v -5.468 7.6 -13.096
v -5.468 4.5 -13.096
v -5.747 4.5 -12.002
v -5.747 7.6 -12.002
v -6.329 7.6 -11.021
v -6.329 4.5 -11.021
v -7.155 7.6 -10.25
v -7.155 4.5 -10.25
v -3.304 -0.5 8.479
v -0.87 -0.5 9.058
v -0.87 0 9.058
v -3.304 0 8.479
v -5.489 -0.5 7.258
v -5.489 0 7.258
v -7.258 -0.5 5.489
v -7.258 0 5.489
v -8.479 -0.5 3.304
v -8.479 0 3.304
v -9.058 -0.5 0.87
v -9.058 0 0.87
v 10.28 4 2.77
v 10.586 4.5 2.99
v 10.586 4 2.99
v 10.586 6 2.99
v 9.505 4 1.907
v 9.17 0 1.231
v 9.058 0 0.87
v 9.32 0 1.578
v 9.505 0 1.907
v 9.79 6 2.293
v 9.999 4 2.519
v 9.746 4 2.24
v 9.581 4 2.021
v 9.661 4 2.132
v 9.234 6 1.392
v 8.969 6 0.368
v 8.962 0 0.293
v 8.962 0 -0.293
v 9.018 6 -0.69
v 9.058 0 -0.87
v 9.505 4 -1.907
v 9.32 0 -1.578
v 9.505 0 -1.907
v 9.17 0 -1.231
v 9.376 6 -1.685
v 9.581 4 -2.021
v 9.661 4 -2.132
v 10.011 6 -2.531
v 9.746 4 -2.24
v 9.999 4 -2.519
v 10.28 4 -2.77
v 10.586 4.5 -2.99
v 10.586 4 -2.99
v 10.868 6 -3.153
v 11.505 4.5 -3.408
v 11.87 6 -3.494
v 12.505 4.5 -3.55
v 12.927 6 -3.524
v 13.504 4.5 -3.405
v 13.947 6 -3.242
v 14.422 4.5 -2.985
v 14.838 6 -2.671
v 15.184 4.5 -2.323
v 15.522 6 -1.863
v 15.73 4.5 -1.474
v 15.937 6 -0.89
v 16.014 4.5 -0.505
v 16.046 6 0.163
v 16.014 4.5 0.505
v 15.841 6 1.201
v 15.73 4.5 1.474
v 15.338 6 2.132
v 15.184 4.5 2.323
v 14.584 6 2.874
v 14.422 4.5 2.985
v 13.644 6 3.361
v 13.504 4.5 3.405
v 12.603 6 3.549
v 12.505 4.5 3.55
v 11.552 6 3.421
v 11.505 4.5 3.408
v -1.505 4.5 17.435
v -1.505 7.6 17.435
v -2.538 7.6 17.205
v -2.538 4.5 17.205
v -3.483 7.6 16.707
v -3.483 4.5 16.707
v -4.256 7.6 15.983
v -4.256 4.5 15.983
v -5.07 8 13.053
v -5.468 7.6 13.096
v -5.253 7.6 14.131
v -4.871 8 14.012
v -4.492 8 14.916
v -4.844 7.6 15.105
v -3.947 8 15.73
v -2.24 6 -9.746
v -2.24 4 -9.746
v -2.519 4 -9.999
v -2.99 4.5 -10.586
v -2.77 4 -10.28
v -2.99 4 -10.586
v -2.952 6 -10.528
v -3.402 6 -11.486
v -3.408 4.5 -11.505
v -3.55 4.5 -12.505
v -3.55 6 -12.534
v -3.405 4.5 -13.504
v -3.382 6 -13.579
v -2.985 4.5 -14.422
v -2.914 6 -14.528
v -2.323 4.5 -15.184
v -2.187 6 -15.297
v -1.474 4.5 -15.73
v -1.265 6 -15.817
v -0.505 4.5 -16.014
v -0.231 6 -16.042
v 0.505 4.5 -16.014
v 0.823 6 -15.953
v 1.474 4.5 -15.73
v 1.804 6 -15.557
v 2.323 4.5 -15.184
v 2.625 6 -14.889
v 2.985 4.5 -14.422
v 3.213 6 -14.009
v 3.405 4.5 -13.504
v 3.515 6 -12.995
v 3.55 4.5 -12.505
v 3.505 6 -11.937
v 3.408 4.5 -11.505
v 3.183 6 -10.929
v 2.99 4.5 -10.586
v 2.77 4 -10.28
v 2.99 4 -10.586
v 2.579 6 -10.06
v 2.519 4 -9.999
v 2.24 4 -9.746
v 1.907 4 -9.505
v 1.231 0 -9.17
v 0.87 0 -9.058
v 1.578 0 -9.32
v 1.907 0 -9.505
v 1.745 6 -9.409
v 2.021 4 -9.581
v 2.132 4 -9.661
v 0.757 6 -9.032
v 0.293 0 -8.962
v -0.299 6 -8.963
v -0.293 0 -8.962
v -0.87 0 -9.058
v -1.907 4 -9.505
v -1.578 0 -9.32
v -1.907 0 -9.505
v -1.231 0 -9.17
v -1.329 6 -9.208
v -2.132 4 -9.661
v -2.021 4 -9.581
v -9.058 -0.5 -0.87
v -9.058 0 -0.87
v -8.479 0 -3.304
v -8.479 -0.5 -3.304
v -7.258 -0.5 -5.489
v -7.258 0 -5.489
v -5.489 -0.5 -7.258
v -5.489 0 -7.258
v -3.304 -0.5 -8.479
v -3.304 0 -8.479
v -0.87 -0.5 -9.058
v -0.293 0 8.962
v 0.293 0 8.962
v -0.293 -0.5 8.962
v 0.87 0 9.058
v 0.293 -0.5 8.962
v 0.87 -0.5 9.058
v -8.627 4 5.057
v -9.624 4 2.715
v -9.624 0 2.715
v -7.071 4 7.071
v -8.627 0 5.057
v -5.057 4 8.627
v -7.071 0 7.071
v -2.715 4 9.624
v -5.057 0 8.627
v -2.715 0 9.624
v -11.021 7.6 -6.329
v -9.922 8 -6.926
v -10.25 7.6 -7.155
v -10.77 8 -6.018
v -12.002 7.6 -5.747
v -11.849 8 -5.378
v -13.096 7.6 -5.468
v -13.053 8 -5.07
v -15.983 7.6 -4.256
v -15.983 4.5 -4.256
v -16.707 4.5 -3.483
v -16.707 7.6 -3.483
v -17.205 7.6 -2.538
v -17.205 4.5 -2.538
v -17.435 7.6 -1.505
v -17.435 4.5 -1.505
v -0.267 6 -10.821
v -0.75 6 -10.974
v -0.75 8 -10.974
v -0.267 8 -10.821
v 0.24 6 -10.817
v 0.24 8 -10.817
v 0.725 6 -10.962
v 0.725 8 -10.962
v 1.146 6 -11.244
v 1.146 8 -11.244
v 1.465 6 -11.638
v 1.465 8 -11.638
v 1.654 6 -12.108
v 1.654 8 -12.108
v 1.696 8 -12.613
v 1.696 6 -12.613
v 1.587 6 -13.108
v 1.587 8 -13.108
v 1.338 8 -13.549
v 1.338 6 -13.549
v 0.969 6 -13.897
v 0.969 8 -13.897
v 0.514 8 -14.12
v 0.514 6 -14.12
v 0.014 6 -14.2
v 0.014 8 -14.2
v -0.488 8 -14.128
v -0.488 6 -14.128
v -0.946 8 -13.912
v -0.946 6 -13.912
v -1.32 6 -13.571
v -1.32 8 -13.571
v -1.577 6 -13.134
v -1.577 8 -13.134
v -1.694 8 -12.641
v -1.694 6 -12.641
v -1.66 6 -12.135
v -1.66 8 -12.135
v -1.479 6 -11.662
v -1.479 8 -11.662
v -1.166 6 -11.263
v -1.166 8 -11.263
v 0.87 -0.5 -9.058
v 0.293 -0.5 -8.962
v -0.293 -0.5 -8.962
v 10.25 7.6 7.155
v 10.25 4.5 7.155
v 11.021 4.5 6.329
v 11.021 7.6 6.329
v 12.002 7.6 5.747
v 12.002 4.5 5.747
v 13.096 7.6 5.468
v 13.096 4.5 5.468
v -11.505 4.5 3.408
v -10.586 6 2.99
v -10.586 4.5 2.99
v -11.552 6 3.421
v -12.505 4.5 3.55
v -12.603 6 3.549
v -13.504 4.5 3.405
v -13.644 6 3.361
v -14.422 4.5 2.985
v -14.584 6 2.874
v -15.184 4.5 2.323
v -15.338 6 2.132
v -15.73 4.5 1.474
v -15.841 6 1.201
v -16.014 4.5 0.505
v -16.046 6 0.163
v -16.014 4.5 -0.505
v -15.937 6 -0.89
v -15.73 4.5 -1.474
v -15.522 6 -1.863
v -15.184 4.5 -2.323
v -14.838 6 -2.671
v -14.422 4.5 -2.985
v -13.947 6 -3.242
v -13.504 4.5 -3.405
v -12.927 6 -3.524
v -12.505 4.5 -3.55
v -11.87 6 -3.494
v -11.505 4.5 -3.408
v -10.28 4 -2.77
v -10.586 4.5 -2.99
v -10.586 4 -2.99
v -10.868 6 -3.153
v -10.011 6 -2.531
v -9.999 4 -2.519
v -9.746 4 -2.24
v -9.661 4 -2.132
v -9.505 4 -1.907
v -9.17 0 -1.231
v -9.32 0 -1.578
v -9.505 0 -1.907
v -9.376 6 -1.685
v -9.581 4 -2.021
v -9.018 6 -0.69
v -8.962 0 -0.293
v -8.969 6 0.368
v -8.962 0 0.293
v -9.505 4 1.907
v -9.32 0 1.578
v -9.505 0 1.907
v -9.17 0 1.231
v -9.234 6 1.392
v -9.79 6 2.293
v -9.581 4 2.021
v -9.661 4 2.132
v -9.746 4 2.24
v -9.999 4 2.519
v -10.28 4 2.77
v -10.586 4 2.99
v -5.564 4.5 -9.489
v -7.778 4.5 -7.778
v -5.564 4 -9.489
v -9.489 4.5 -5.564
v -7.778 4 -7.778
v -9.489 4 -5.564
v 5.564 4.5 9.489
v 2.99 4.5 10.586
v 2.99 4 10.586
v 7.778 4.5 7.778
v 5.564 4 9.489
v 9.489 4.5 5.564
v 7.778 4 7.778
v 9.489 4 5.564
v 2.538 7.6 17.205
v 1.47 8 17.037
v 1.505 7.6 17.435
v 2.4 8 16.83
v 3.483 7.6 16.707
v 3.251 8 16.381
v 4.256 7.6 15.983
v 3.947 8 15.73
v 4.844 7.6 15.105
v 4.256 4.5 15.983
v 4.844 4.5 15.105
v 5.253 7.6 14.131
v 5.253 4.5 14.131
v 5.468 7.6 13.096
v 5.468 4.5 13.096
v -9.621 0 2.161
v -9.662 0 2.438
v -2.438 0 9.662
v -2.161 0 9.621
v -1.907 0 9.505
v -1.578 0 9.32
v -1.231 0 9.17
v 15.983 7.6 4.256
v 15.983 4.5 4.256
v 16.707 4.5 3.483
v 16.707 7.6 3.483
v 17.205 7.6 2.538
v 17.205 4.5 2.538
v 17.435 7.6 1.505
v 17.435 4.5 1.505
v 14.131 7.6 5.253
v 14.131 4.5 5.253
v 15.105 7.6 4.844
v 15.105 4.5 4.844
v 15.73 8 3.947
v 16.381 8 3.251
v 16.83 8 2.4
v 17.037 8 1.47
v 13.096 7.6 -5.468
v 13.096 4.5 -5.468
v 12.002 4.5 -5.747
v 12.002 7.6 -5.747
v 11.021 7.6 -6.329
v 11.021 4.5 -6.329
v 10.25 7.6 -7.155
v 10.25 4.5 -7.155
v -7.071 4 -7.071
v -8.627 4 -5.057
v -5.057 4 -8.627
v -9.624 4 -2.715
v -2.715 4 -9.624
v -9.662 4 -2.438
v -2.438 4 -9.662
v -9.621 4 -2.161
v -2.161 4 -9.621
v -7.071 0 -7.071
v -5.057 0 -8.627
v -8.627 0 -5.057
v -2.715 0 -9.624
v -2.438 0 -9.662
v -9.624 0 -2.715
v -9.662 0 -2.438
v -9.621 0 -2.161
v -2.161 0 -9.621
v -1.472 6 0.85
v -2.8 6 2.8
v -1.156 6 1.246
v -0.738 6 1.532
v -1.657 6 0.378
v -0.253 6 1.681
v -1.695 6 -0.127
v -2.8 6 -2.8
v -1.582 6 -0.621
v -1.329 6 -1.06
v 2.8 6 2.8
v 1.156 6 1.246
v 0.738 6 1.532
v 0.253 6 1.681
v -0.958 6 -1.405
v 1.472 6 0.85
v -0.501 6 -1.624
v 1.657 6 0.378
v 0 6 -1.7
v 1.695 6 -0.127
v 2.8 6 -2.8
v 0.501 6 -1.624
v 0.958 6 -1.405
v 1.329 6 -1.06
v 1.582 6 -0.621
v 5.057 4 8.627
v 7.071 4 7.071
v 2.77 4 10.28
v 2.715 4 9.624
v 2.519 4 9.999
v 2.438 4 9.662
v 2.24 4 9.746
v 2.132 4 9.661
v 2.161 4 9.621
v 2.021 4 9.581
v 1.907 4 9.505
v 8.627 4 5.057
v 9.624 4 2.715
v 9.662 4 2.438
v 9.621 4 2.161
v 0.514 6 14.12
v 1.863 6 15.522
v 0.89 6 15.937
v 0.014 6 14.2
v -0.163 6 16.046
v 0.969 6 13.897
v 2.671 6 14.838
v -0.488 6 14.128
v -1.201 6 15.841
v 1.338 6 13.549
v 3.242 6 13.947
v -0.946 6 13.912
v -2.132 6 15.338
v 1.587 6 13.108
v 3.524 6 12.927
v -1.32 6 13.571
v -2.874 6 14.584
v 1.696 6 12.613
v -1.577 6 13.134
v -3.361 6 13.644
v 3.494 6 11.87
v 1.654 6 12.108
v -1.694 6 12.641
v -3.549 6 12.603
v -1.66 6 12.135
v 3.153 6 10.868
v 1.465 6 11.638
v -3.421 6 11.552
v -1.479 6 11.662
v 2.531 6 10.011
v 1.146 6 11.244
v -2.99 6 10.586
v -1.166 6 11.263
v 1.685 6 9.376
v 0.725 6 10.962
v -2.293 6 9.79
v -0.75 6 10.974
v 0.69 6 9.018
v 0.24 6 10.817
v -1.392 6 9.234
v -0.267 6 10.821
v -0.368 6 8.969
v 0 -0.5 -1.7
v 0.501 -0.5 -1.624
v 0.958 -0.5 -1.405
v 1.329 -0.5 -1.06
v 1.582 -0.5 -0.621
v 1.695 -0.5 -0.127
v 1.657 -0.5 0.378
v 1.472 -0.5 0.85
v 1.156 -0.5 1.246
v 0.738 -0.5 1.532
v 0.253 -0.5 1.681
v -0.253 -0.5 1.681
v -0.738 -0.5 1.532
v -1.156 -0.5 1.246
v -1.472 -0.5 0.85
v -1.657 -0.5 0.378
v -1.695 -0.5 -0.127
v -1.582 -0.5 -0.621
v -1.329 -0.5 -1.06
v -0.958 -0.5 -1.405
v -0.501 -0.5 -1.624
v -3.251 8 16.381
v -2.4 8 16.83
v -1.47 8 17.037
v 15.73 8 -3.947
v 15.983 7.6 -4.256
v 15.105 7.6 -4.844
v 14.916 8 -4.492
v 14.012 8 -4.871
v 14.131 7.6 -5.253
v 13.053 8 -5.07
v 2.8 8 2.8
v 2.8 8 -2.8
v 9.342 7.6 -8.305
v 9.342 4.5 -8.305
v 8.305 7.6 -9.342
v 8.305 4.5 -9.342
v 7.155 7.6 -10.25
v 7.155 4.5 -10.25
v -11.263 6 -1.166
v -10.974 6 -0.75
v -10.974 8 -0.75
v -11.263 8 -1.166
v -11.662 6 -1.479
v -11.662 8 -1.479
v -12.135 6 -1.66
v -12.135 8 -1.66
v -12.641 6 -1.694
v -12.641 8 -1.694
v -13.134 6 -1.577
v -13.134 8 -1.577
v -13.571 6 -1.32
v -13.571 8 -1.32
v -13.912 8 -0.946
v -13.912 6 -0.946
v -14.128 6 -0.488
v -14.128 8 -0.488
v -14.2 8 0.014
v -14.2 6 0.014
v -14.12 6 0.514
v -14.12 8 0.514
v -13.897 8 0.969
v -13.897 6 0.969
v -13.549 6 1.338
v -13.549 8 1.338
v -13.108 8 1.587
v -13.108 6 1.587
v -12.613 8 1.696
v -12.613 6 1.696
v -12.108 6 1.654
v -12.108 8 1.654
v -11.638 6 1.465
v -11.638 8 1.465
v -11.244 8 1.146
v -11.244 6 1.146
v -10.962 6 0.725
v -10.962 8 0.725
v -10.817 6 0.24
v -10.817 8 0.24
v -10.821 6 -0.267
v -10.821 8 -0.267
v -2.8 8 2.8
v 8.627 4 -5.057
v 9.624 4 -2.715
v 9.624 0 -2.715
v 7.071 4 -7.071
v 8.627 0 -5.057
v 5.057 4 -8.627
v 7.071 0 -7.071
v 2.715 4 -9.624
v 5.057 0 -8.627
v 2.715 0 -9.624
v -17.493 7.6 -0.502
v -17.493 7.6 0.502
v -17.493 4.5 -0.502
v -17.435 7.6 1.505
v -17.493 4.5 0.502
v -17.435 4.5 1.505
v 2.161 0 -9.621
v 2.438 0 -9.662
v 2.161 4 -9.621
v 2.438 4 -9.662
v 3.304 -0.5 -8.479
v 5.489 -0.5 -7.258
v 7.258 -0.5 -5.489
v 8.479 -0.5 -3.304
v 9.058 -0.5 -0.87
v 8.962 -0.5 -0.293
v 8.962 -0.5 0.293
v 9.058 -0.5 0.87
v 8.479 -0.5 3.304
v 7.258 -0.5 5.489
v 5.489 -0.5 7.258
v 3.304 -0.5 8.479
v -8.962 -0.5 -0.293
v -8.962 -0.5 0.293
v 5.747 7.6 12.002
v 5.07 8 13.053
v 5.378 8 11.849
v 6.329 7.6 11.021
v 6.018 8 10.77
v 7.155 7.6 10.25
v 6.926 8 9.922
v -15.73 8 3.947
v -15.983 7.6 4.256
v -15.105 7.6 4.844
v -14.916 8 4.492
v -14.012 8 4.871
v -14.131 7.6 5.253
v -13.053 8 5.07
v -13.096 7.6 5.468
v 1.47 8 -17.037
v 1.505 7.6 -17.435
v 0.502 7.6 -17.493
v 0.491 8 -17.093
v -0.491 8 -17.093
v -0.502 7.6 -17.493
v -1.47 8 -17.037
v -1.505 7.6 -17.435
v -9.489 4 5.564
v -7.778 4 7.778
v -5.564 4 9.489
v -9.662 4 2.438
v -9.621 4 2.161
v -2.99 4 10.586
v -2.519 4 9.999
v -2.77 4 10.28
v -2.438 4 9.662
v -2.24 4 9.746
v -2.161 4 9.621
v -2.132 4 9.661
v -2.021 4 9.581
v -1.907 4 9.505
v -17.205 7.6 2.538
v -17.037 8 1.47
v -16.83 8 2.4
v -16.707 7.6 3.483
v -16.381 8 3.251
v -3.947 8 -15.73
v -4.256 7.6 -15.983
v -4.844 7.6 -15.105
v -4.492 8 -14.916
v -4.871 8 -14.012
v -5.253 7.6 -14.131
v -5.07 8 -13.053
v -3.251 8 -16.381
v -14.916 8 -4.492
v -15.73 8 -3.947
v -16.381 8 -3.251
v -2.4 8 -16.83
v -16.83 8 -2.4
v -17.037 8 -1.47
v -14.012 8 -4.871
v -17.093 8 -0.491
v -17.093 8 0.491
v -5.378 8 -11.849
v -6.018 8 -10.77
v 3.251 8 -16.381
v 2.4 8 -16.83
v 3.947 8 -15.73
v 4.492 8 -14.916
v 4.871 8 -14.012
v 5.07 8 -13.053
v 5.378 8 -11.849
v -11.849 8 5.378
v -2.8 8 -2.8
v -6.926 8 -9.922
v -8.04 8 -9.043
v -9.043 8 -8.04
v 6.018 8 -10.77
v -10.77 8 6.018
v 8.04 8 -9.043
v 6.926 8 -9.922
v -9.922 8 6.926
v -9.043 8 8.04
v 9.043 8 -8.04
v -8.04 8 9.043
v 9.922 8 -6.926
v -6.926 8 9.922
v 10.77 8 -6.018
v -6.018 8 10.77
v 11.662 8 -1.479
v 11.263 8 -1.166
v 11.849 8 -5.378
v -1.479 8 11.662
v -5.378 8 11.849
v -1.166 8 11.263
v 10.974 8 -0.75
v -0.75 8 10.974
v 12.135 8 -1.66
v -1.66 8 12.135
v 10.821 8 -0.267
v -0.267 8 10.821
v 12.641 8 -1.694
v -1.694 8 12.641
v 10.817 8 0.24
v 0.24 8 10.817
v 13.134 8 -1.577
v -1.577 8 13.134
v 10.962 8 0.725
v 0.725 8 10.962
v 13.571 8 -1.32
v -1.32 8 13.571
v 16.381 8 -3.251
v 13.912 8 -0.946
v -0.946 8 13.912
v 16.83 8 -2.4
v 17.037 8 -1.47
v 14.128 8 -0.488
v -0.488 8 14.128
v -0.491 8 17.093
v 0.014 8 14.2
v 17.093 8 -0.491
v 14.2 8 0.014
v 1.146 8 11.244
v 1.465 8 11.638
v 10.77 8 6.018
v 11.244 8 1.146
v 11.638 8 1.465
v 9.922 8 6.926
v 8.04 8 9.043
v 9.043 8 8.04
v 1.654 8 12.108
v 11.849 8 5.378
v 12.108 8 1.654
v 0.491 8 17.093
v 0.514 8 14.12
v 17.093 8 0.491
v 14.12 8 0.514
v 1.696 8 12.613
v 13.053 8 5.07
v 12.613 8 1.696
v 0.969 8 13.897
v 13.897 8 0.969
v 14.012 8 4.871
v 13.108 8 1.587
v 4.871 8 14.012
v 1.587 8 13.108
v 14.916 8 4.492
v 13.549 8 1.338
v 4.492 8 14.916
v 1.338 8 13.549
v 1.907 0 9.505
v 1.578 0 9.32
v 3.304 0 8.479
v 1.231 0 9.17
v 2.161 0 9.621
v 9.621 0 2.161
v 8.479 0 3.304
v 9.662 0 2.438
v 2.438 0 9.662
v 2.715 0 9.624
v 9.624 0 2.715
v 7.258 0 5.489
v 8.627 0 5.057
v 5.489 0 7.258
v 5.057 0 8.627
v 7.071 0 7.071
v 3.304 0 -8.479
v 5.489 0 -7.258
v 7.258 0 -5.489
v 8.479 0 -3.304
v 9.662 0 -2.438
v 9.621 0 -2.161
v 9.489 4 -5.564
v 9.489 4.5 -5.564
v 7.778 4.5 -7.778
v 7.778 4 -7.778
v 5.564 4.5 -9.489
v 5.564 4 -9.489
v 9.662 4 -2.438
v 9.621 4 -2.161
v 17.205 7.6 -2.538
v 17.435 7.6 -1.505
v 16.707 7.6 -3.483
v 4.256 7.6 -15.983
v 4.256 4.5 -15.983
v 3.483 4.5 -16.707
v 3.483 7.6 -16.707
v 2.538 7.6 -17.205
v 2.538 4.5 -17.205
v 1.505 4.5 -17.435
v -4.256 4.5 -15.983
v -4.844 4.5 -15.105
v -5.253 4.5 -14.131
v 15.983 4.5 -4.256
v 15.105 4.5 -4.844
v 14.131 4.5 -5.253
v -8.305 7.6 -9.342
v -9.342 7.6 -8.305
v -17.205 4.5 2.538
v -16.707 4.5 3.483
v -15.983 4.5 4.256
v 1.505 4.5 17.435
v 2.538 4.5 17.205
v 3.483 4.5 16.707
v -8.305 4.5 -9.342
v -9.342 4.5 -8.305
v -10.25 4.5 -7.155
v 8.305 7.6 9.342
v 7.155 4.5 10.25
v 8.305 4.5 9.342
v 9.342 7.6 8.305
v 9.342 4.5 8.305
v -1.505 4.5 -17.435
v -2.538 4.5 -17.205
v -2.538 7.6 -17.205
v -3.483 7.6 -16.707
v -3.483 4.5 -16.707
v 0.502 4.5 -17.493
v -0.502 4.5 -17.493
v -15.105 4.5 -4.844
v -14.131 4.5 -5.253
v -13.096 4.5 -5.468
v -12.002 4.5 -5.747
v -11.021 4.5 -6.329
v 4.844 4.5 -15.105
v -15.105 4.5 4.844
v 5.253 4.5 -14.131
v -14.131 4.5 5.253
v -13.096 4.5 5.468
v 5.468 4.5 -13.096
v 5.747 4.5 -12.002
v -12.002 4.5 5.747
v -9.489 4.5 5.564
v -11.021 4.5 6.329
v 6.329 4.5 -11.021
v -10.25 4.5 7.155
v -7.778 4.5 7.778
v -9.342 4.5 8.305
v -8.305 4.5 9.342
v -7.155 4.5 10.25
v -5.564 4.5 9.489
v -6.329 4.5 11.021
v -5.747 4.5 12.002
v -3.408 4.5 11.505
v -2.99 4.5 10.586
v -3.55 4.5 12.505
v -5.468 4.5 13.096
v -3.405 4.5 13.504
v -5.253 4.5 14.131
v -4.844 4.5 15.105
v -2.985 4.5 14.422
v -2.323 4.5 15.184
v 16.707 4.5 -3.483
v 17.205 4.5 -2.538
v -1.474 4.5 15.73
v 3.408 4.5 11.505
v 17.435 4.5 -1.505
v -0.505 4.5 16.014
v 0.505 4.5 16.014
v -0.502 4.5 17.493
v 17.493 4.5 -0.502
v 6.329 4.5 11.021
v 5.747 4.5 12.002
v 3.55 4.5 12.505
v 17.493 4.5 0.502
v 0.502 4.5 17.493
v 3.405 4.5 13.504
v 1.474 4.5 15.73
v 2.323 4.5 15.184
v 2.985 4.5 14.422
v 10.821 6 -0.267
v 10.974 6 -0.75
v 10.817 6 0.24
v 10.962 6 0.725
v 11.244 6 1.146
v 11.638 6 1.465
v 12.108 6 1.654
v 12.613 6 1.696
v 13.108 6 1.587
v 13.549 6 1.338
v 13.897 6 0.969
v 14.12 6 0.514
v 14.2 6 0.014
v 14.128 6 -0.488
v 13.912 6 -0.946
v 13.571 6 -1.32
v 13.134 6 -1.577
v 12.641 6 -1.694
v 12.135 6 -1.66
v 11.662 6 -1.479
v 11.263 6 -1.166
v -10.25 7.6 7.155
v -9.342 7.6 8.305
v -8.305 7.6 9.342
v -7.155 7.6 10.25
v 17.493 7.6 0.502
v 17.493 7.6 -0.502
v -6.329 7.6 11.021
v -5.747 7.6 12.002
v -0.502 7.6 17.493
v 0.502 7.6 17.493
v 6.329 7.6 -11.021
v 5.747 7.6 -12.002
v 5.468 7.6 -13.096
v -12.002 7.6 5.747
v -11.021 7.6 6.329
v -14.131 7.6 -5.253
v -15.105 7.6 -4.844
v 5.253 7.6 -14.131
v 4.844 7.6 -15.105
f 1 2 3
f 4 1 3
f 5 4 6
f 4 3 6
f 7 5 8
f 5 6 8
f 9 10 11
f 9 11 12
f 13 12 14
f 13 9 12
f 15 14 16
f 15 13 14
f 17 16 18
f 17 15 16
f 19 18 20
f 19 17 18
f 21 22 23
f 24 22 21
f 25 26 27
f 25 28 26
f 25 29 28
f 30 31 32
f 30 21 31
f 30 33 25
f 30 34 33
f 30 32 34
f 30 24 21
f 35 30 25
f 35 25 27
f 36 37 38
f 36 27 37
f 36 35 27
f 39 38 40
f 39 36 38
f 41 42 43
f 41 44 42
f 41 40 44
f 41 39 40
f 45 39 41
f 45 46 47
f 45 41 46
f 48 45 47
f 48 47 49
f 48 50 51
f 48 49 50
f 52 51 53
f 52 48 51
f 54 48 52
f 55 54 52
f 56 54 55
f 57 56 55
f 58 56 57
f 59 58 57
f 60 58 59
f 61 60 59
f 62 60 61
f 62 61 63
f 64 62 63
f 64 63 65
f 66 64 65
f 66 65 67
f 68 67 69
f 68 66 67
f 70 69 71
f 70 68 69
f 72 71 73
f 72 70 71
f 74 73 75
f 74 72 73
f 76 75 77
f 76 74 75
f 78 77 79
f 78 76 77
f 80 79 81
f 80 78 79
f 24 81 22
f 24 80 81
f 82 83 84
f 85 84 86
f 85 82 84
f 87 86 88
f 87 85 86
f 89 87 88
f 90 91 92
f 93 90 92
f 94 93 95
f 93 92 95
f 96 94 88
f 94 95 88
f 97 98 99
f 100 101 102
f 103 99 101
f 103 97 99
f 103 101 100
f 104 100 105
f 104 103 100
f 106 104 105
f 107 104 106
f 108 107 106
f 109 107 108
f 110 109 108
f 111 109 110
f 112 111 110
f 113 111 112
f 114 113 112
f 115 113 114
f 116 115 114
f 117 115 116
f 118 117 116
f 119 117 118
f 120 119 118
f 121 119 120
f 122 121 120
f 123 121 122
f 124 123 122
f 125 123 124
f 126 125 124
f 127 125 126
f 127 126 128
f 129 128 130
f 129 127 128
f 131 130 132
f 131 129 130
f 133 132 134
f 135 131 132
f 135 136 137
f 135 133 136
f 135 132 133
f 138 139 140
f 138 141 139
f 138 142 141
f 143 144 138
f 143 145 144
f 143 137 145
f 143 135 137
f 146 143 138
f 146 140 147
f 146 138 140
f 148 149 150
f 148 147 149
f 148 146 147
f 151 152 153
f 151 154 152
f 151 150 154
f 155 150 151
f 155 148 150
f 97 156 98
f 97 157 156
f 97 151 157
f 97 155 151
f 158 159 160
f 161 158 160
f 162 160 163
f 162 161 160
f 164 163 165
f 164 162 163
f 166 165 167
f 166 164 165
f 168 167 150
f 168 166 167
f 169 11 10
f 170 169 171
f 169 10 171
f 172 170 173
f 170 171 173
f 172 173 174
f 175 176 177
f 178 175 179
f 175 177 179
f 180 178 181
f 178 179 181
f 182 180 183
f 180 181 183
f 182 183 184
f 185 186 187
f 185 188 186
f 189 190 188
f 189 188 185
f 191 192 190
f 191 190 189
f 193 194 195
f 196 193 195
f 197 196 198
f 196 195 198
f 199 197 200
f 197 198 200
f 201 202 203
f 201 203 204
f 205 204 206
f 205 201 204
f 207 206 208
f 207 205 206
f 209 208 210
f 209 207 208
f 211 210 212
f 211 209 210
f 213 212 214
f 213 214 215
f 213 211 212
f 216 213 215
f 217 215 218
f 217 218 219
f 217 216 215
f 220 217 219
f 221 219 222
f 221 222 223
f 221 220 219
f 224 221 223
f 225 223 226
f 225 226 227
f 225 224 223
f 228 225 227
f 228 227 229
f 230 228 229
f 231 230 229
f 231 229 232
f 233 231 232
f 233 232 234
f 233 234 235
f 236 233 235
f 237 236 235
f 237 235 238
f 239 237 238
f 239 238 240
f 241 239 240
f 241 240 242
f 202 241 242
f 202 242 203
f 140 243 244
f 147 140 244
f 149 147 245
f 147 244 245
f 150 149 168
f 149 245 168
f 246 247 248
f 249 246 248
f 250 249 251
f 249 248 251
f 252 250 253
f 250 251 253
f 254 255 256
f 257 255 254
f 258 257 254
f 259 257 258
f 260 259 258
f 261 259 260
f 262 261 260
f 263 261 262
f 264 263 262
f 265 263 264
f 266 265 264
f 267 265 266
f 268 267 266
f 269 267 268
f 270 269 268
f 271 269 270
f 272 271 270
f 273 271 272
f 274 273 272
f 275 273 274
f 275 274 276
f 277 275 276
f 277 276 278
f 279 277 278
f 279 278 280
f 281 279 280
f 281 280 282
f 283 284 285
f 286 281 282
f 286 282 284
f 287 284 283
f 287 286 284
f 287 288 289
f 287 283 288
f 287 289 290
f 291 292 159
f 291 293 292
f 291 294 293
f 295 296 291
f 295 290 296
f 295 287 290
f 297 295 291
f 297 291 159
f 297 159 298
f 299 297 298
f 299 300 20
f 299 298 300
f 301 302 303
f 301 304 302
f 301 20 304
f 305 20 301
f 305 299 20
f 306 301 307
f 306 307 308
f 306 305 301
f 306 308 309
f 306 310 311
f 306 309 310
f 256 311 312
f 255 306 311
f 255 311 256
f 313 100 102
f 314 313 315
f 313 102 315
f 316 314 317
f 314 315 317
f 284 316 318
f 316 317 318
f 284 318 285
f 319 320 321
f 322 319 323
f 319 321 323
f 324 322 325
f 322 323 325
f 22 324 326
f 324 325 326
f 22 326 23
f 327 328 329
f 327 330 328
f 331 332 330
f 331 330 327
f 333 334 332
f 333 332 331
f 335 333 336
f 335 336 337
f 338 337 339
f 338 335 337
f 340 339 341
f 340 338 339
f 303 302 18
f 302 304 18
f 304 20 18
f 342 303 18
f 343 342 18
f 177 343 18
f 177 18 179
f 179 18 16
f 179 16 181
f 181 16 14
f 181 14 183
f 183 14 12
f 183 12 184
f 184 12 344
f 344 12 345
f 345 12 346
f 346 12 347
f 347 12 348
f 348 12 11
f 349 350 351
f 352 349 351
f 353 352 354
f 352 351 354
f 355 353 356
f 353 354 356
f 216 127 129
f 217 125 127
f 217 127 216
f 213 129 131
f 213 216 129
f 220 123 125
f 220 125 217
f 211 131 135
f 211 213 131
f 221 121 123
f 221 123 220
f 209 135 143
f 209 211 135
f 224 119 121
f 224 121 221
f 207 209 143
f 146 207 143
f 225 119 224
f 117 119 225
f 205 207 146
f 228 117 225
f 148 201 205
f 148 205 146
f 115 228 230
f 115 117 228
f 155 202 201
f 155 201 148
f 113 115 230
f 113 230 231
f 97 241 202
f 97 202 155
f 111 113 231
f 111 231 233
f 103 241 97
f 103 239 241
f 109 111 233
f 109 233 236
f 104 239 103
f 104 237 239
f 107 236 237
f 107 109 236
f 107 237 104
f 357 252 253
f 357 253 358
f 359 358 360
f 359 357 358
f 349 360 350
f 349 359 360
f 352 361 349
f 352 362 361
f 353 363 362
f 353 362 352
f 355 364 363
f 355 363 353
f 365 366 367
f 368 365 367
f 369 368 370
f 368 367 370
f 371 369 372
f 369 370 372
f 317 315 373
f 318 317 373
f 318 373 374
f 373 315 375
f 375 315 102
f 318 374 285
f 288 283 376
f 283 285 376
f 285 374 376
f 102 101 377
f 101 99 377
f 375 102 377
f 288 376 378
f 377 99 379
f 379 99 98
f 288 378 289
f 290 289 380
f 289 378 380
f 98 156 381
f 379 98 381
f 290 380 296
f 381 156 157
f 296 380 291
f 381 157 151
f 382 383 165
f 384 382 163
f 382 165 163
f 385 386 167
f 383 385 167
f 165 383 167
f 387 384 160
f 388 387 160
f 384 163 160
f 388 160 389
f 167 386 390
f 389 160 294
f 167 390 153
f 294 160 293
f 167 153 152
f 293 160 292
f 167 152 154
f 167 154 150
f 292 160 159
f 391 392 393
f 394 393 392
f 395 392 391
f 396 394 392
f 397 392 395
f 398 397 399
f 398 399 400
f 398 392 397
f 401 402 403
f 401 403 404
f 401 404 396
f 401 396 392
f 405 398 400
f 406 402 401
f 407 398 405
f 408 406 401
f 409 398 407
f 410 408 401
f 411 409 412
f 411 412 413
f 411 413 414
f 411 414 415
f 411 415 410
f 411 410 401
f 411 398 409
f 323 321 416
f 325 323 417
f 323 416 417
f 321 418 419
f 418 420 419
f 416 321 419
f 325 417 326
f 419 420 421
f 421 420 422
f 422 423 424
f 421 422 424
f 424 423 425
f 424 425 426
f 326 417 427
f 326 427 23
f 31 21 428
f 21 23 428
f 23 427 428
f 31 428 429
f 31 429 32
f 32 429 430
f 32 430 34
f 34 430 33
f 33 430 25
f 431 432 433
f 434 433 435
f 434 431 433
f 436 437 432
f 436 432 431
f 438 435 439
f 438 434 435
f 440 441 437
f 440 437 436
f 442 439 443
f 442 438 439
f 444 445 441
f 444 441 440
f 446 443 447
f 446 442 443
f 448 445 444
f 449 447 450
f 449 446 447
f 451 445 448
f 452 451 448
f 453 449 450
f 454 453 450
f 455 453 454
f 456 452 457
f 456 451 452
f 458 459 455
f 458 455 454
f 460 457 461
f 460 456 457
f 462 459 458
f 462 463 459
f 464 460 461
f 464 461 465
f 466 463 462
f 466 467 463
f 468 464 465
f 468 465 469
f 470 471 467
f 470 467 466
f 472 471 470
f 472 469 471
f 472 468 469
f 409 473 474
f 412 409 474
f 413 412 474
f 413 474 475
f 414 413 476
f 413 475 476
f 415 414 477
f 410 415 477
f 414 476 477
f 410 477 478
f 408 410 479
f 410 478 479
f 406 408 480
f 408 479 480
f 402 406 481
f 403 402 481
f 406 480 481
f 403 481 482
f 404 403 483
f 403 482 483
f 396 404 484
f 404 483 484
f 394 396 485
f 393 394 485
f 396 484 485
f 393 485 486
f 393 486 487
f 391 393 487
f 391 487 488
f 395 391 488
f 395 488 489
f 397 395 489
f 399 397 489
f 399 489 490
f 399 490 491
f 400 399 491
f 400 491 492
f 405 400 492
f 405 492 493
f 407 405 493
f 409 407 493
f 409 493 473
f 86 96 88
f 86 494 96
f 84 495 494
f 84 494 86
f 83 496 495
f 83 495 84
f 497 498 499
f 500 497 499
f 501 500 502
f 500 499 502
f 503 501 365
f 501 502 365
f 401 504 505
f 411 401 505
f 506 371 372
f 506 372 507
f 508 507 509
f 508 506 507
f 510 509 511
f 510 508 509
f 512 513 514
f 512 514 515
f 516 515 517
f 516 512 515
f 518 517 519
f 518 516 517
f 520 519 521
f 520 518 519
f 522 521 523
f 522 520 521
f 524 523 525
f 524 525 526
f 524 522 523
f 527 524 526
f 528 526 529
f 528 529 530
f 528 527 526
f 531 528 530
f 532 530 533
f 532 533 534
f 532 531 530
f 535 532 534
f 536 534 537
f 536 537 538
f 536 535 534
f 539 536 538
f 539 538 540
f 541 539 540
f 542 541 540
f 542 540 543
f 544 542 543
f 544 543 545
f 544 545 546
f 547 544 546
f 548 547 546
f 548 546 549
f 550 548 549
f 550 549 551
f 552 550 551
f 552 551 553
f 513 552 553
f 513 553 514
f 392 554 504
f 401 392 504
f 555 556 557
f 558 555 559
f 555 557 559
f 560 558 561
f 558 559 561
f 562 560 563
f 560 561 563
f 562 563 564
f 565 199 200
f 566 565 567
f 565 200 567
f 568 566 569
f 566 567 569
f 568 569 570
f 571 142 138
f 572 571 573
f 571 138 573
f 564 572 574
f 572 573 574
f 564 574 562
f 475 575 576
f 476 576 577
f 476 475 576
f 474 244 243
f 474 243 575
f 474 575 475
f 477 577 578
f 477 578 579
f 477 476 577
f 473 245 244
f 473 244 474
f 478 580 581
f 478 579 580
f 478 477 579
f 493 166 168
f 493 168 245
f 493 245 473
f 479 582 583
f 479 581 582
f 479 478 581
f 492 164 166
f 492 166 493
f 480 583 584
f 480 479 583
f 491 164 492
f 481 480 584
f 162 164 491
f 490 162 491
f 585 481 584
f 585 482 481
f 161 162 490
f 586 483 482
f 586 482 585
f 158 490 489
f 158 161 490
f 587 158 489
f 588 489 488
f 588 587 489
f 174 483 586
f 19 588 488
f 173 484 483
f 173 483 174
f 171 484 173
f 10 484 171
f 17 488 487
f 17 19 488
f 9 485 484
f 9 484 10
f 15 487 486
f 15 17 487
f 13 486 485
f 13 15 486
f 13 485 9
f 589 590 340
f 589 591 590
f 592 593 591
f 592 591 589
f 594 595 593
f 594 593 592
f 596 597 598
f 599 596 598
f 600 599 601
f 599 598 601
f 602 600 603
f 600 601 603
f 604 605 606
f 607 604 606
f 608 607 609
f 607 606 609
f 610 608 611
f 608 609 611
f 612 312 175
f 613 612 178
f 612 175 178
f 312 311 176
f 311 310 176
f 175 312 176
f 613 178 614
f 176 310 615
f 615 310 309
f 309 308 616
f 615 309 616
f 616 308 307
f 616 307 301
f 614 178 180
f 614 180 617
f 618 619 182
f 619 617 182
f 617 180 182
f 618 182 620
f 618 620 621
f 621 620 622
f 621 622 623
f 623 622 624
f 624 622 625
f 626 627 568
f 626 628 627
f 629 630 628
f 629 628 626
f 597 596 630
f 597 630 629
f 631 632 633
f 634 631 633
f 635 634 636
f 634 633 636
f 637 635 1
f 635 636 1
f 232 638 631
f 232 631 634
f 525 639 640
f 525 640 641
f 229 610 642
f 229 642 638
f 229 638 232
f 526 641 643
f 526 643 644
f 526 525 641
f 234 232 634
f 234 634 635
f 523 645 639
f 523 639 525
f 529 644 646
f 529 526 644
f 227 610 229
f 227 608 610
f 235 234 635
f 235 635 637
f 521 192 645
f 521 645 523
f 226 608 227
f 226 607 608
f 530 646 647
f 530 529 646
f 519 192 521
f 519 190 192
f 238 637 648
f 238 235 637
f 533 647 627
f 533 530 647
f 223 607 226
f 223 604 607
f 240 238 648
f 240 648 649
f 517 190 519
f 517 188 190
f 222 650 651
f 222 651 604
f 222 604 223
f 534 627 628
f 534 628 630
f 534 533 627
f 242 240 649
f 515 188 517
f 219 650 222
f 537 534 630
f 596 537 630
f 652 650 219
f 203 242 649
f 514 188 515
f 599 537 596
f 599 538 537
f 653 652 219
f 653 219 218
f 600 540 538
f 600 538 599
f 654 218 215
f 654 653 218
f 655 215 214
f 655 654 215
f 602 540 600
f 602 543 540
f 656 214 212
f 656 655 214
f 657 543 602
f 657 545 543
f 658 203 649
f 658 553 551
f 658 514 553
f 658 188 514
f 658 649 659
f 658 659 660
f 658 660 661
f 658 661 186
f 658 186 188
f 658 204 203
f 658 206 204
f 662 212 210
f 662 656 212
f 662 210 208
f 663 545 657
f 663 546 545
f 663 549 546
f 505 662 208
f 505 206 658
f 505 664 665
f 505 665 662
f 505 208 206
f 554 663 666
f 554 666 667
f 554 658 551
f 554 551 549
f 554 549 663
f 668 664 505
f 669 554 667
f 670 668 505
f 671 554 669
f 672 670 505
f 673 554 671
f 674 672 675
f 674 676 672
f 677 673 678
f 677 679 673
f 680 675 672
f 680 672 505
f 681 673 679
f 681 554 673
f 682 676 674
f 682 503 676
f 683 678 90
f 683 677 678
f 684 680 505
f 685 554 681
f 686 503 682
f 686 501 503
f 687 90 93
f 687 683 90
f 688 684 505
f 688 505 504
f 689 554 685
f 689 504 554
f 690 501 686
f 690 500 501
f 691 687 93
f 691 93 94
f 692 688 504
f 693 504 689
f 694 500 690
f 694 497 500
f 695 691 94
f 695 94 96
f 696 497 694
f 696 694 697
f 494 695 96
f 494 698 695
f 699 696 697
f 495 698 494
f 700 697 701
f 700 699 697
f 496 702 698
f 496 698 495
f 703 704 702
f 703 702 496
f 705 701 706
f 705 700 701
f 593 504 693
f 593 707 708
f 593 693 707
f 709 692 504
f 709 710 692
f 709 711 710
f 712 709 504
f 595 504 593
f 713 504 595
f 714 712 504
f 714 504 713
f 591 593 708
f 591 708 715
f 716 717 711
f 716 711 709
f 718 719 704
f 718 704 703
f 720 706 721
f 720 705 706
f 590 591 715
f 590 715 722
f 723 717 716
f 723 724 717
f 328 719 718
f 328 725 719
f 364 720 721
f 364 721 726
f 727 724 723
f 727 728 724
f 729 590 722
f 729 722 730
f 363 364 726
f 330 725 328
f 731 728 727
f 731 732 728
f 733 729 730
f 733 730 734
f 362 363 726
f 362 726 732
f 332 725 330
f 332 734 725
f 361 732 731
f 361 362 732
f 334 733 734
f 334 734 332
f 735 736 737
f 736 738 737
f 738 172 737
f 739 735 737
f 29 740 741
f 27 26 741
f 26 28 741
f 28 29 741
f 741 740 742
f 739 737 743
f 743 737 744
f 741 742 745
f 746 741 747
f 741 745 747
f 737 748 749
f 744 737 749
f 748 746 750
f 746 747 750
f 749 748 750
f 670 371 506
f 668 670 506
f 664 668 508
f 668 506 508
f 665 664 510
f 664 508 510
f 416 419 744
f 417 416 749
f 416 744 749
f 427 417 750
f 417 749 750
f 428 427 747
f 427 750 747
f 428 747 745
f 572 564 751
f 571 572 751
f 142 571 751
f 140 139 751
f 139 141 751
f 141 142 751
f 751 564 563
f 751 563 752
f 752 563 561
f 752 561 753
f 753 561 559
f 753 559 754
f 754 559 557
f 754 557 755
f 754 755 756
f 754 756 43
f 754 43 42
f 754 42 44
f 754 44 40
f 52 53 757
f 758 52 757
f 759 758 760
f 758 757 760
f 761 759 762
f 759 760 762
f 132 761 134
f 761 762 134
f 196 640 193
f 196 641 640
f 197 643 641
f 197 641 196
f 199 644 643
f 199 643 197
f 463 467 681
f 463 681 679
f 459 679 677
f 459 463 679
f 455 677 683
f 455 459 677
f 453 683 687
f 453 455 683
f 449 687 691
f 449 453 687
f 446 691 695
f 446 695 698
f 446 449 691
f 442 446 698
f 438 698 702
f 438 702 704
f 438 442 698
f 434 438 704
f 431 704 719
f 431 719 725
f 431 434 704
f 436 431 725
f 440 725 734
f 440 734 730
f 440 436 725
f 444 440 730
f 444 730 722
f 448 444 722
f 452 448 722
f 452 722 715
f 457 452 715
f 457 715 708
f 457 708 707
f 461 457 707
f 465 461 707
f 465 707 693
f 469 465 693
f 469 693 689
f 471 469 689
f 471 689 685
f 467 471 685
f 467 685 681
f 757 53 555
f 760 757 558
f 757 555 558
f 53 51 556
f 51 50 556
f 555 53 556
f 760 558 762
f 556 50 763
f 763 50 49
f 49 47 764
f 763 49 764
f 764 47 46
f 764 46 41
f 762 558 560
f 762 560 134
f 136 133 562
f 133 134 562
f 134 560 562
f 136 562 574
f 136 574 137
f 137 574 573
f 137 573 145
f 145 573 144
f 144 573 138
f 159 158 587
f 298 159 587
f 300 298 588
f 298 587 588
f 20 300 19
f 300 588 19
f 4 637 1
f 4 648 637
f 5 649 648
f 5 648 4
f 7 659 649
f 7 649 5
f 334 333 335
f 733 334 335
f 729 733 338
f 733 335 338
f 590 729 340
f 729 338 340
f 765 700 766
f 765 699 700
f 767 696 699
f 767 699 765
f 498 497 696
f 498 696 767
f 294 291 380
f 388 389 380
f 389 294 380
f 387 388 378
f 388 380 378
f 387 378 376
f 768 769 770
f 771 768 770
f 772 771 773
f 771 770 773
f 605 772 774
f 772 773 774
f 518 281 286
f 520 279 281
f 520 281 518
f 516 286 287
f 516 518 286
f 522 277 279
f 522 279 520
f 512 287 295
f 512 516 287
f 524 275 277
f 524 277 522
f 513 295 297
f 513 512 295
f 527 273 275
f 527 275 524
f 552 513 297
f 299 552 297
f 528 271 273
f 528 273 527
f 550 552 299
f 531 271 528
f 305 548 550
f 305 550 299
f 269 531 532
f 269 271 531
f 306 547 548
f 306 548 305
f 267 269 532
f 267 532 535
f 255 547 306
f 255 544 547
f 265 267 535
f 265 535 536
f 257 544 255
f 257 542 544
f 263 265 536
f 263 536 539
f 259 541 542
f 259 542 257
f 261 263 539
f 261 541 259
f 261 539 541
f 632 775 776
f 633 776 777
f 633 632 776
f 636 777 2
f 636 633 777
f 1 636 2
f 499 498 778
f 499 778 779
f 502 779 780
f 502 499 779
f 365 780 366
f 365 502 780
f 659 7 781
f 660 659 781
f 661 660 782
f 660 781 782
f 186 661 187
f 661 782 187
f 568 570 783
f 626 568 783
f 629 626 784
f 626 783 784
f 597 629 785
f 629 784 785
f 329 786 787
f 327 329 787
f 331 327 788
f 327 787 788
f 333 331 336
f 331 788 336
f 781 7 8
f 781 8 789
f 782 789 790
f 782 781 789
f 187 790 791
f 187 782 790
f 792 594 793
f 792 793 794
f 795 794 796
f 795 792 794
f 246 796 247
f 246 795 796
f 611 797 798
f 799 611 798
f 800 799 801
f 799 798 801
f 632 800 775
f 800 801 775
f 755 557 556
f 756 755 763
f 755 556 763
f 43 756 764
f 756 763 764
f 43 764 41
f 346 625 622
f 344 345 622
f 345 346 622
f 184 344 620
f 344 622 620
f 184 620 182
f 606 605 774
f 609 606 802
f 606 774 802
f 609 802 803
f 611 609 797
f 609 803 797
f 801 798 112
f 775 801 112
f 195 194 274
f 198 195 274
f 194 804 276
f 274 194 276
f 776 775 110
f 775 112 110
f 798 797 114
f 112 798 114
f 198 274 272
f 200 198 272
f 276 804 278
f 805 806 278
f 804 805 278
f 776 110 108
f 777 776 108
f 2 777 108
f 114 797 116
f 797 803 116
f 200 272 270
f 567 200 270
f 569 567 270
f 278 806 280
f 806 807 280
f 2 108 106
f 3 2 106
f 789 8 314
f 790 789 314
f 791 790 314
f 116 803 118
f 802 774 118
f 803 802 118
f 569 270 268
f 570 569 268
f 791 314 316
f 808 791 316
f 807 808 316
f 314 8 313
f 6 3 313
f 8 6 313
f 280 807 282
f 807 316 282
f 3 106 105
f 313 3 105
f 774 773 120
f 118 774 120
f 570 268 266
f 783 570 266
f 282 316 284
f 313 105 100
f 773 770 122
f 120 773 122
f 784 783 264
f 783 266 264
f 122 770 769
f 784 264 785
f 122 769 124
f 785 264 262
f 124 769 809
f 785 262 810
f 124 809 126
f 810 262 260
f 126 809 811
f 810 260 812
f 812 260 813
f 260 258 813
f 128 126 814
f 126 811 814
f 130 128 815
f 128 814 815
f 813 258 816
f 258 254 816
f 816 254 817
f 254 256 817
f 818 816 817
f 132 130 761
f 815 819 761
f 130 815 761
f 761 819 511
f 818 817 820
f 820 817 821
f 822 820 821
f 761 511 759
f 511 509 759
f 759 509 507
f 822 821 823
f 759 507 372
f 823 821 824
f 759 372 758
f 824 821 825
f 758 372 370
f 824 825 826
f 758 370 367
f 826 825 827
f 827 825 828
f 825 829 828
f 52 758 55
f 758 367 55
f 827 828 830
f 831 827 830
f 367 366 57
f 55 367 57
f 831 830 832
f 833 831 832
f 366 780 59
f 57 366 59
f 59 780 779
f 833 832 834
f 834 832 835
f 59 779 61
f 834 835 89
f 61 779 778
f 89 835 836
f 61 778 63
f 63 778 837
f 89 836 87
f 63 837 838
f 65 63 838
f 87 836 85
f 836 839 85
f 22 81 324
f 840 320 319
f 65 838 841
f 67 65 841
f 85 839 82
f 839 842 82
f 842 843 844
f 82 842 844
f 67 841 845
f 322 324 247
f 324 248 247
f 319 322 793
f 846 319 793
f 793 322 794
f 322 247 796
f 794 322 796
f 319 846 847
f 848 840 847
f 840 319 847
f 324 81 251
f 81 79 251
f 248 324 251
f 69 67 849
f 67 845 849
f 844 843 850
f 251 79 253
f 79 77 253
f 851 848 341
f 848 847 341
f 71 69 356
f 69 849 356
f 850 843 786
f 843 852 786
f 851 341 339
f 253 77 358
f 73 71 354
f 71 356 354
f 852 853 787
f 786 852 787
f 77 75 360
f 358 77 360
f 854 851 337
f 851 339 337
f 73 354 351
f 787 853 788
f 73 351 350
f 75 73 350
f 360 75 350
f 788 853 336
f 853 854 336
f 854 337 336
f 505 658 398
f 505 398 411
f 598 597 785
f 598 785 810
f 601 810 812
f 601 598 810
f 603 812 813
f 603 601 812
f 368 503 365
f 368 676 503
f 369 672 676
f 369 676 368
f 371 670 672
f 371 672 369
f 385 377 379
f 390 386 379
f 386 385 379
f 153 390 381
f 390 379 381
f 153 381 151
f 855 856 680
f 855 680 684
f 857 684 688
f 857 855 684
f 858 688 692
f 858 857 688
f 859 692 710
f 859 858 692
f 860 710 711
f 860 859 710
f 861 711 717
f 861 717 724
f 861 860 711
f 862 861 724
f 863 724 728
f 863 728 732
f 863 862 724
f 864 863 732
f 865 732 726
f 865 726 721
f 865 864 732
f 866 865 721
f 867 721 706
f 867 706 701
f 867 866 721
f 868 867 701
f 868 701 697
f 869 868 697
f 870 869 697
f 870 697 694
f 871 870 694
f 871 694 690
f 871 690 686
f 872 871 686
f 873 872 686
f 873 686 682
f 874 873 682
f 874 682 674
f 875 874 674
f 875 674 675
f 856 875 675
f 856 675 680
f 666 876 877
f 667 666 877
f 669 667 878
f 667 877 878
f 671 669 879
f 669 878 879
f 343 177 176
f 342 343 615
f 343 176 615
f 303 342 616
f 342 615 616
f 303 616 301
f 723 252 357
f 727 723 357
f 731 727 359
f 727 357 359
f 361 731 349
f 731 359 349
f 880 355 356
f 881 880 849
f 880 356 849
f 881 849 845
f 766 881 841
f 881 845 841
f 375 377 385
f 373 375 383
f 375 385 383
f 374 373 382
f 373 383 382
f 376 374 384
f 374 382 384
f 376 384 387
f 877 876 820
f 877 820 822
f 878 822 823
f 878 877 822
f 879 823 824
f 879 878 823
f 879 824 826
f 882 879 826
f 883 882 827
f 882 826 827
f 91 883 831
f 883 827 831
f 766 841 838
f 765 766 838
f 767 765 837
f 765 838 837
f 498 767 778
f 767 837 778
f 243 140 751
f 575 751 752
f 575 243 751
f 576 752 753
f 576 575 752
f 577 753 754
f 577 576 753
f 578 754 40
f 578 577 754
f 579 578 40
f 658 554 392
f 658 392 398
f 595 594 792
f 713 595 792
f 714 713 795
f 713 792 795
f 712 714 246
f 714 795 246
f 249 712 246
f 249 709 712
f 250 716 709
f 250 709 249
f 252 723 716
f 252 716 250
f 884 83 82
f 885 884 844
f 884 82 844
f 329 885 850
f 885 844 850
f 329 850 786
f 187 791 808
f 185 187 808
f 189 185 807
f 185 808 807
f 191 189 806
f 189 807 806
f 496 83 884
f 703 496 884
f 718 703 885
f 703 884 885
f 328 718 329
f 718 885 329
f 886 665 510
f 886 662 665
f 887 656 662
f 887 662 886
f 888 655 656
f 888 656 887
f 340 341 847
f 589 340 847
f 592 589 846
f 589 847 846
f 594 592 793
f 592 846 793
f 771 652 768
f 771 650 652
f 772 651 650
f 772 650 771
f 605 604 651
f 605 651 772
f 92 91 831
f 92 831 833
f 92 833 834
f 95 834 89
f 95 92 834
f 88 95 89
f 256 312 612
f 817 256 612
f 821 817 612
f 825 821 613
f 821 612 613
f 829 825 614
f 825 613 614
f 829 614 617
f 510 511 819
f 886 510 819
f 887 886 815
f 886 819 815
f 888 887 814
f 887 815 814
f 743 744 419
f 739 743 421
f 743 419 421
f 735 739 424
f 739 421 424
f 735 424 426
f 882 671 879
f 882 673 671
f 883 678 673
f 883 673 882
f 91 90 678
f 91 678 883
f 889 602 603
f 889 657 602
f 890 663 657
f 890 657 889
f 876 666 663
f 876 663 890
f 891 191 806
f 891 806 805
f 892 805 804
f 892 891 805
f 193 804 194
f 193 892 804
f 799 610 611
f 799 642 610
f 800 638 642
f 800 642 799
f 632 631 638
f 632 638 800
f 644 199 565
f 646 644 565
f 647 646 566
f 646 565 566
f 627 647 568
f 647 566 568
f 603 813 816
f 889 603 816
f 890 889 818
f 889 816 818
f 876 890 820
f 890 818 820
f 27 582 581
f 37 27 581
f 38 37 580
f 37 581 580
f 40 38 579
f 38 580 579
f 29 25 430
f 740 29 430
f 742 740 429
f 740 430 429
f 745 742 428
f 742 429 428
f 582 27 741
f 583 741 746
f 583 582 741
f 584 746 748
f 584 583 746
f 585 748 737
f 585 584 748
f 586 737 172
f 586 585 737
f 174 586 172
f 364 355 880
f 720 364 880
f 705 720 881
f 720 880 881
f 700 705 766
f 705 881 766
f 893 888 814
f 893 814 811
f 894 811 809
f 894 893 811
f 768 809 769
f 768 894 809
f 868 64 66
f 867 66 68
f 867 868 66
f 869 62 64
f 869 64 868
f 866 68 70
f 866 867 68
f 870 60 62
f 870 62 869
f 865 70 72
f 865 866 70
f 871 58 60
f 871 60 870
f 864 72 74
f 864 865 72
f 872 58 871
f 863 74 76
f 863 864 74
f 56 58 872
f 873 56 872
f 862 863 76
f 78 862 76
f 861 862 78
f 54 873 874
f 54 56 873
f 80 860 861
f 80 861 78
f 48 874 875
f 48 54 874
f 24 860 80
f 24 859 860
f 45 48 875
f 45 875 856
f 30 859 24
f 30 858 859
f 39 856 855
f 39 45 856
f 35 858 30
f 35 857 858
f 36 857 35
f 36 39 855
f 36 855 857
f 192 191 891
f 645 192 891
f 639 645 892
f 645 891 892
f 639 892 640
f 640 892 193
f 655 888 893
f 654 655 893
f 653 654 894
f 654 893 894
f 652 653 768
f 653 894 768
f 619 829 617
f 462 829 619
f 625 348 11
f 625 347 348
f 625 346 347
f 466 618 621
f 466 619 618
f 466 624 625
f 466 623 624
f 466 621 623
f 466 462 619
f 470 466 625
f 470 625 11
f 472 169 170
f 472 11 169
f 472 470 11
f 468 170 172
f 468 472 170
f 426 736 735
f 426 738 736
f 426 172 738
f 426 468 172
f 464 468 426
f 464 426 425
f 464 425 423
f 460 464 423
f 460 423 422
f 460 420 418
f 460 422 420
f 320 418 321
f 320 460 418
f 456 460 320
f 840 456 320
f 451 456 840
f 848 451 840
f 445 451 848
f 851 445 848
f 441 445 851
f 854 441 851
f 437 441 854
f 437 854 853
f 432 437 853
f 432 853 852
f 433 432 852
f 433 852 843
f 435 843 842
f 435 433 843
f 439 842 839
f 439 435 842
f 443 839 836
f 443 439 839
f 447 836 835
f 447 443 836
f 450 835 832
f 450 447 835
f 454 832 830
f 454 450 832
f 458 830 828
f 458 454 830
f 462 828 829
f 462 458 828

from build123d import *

# Parameters (mm, degrees)
ESQUISSE1_R                  = 10
BOSS_EXTRU_1_DEPTH           = 4
ESQUISSE8_R                  = 11
BOSS_EXTRU_4_DEPTH           = 0.5
ESQUISSE3_R                  = 17.5
ESQUISSE3_R_2                = 1.7
BOSS_EXTRU_2_DEPTH           = 3.5
ENL_V_MAT_EXTRU_2_DEPTH      = 26.154522456
ENL_V_MAT_EXTRU_2_DEPTH_BACK = 1.5
ESQUISSE4_R                  = 3.55
ESQUISSE11_OUTSIDE_W         = 47.028
ESQUISSE11_OUTSIDE_H         = 47.028
ENL_V_MAT_EXTRU_3_DEPTH      = 27.009613607
CONG_1_R                     = 4
CONG_2_R                     = 1
CHANFREIN2_SIZE              = 0.4
ESQUISSE12_R                 = 1.7
ENL_V_MAT_EXTRU_4_DEPTH      = 27.009613773
ESQUISSE13_W                 = 5.6
ESQUISSE13_H                 = 5.6
ENL_V_MAT_EXTRU_5_DEPTH      = 2
BOSS_EXTRU_5_START           = 0.5
ESQUISSE14_R                 = 9.1
ESQUISSE14_R_2               = 1.7
BOSS_EXTRU_5_DEPTH           = 0.5
ESQUISSE15_R                 = 3.55
ENL_V_MAT_EXTRU_6_DEPTH      = 0.5


with BuildPart() as part:
    # Esquisse1 → Boss.-Extru.1 (new body)
    with BuildSketch(Plane(origin=(0, 0, 0), x_dir=(1, 0, 0), z_dir=(0, 1, 0))):
        Circle(ESQUISSE1_R)
    extrude(amount=BOSS_EXTRU_1_DEPTH)

    # Esquisse8 → Boss.-Extru.4 (add)
    with BuildSketch(Plane(origin=(0, 4, 0), x_dir=(1, 0, 0), z_dir=(0, 1, 0))):
        Circle(ESQUISSE8_R)
    extrude(amount=BOSS_EXTRU_4_DEPTH)

    # Esquisse3 → Boss.-Extru.2 (add)
    with BuildSketch(Plane(origin=(0, 4.5, 0), x_dir=(1, 0, 0), z_dir=(0, 1, 0))):
        Circle(ESQUISSE3_R)
        with Locations((-12.5, 0)):
            Circle(ESQUISSE3_R_2, mode=Mode.SUBTRACT)
        with Locations((0, 12.5)):
            Circle(ESQUISSE3_R_2, mode=Mode.SUBTRACT)
        with Locations((12.5, 0)):
            Circle(ESQUISSE3_R_2, mode=Mode.SUBTRACT)
        with Locations((0, -12.5)):
            Circle(ESQUISSE3_R_2, mode=Mode.SUBTRACT)
    extrude(amount=BOSS_EXTRU_2_DEPTH)

    # Esquisse4 → Enlèv. mat.-Extru.2 (cut, two sides: drawn at the far end of the back side and taken through both)
    with BuildSketch(Plane.XZ.offset(-4.5).offset(-ENL_V_MAT_EXTRU_2_DEPTH_BACK)):
        with Locations((0, -12.5)):
            Circle(ESQUISSE4_R)
        with Locations((-12.5, 0)):
            Circle(ESQUISSE4_R)
        with Locations((0, 12.5)):
            Circle(ESQUISSE4_R)
        with Locations((12.5, 0)):
            Circle(ESQUISSE4_R)
    extrude(amount=ENL_V_MAT_EXTRU_2_DEPTH + ENL_V_MAT_EXTRU_2_DEPTH_BACK, mode=Mode.SUBTRACT)

    # Esquisse11 outside → Enlèv. mat.-Extru.3 (cut, through all)
    with BuildSketch(Plane(origin=(0, 8, 0), x_dir=(1, 0, 0), z_dir=(0, 1, 0))):
        Rectangle(ESQUISSE11_OUTSIDE_W, ESQUISSE11_OUTSIDE_H)
        with BuildLine():
            ThreePointArc((-5.365249295, -11.29), (0, -18), (5.365249295, -11.29))
            ThreePointArc((5.365249295, -11.29), (8.838834765, -8.838834765), (11.29, -5.365249295))
            ThreePointArc((11.29, -5.365249295), (18, 0), (11.29, 5.365249295))
            ThreePointArc((11.29, 5.365249295), (8.838834765, 8.838834765), (5.365249295, 11.29))
            ThreePointArc((5.365249295, 11.29), (0, 18), (-5.365249295, 11.29))
            ThreePointArc((-5.365249295, 11.29), (-8.838834765, 8.838834765), (-11.29, 5.365249295))
            ThreePointArc((-11.29, 5.365249295), (-18, 0), (-11.29, -5.365249295))
            ThreePointArc((-11.29, -5.365249295), (-8.838834765, -8.838834765), (-5.365249295, -11.29))
        make_face(mode=Mode.SUBTRACT)
    extrude(amount=-ENL_V_MAT_EXTRU_3_DEPTH, mode=Mode.SUBTRACT)

    # Congé1
    cong_1_edges = [part.edges().sort_by_distance(p)[0] for p in [
        (-11.29, 6.25, -5.365249295),
        (-5.365249295, 6.25, -11.29),
        (5.365249295, 6.25, -11.29),
        (11.29, 6.25, -5.365249295),
        (11.29, 6.25, 5.365249295),
        (5.365249295, 6.25, 11.29),
        (-11.29, 6.25, 5.365249295),
        (-5.365249295, 6.25, 11.29),
        (-17.29, 6.25, -2.702942841),
        (-17.29, 6.25, 2.702942841),
        (-2.702942841, 6.25, -17.29),
        (2.702942841, 6.25, -17.29),
        (17.29, 6.25, -2.702942841),
        (17.29, 6.25, 2.702942841),
        (-2.702942841, 6.25, 17.29),
        (2.702942841, 6.25, 17.29),
    ]]
    fillet(cong_1_edges, radius=CONG_1_R)

    # Congé2
    cong_2_edges = [part.edges().sort_by_distance(p)[0] for p in [
        (2.239962765, 2, 9.7459),
        (-2.239962765, 2, 9.7459),
        (-9.7459, 2, 2.239962765),
        (-9.7459, 2, -2.239962765),
        (-2.239962765, 2, -9.7459),
        (2.239962765, 2, -9.7459),
        (9.7459, 2, 2.239962765),
        (9.7459, 2, -2.239962765),
    ]]
    fillet(cong_2_edges, radius=CONG_2_R)

    # Chanfrein2
    chanfrein2_edges = [part.edges().sort_by_distance(p)[0] for p in [
        (3.027485343, 8, -16.98773311),
        (0, 8, -17.5),
        (5.071719486, 8, -14.627830223),
        (-3.027485343, 8, -16.98773311),
        (6.002970096, 8, -11.490557352),
        (-5.071719486, 8, -14.627830223),
        (8.838834765, 8, -8.838834765),
        (-6.002970096, 8, -11.490557352),
        (11.490557352, 8, -6.002970096),
        (-8.838834765, 8, -8.838834765),
        (14.627830223, 8, -5.071719486),
        (-11.490557352, 8, -6.002970096),
        (16.98773311, 8, -3.027485343),
        (-14.627830223, 8, -5.071719486),
        (17.5, 8, 0),
        (-16.98773311, 8, -3.027485343),
        (16.98773311, 8, 3.027485343),
        (-17.5, 8, 0),
        (14.627830223, 8, 5.071719486),
        (-16.98773311, 8, 3.027485343),
        (11.490557352, 8, 6.002970096),
        (-14.627830223, 8, 5.071719486),
        (8.838834765, 8, 8.838834765),
        (-11.490557352, 8, 6.002970096),
        (6.002970096, 8, 11.490557352),
        (-8.838834765, 8, 8.838834765),
        (5.071719486, 8, 14.627830223),
        (-6.002970096, 8, 11.490557352),
        (3.027485343, 8, 16.98773311),
        (-5.071719486, 8, 14.627830223),
        (0, 8, 17.5),
        (-3.027485343, 8, 16.98773311),
    ]]
    chamfer(chanfrein2_edges, length=CHANFREIN2_SIZE)

    # Esquisse12 → Enlèv. mat.-Extru.4 (cut, through all)
    with BuildSketch(Plane.XZ):
        Circle(ESQUISSE12_R)
    extrude(amount=-ENL_V_MAT_EXTRU_4_DEPTH, mode=Mode.SUBTRACT)

    # Esquisse13 → Enlèv. mat.-Extru.5 (cut)
    with BuildSketch(Plane(origin=(0, 8, 0), x_dir=(1, 0, 0), z_dir=(0, 1, 0))):
        Rectangle(ESQUISSE13_W, ESQUISSE13_H)
    extrude(amount=-ENL_V_MAT_EXTRU_5_DEPTH, mode=Mode.SUBTRACT)

    # Esquisse14 → Boss.-Extru.5 (add)
    with BuildSketch(Plane.XZ.offset(BOSS_EXTRU_5_START)):
        Circle(ESQUISSE14_R)
        Circle(ESQUISSE14_R_2, mode=Mode.SUBTRACT)
    extrude(amount=-BOSS_EXTRU_5_DEPTH)

    # Esquisse15 → Enlèv. mat.-Extru.6 (cut)
    with BuildSketch(Plane.XZ.offset(0.5)):
        with Locations((12.5, 0)):
            Circle(ESQUISSE15_R)
        with Locations((0, 12.5)):
            Circle(ESQUISSE15_R)
        with Locations((-12.5, 0)):
            Circle(ESQUISSE15_R)
        with Locations((0, -12.5)):
            Circle(ESQUISSE15_R)
    extrude(amount=-ENL_V_MAT_EXTRU_6_DEPTH, mode=Mode.SUBTRACT)


solid = part.part
